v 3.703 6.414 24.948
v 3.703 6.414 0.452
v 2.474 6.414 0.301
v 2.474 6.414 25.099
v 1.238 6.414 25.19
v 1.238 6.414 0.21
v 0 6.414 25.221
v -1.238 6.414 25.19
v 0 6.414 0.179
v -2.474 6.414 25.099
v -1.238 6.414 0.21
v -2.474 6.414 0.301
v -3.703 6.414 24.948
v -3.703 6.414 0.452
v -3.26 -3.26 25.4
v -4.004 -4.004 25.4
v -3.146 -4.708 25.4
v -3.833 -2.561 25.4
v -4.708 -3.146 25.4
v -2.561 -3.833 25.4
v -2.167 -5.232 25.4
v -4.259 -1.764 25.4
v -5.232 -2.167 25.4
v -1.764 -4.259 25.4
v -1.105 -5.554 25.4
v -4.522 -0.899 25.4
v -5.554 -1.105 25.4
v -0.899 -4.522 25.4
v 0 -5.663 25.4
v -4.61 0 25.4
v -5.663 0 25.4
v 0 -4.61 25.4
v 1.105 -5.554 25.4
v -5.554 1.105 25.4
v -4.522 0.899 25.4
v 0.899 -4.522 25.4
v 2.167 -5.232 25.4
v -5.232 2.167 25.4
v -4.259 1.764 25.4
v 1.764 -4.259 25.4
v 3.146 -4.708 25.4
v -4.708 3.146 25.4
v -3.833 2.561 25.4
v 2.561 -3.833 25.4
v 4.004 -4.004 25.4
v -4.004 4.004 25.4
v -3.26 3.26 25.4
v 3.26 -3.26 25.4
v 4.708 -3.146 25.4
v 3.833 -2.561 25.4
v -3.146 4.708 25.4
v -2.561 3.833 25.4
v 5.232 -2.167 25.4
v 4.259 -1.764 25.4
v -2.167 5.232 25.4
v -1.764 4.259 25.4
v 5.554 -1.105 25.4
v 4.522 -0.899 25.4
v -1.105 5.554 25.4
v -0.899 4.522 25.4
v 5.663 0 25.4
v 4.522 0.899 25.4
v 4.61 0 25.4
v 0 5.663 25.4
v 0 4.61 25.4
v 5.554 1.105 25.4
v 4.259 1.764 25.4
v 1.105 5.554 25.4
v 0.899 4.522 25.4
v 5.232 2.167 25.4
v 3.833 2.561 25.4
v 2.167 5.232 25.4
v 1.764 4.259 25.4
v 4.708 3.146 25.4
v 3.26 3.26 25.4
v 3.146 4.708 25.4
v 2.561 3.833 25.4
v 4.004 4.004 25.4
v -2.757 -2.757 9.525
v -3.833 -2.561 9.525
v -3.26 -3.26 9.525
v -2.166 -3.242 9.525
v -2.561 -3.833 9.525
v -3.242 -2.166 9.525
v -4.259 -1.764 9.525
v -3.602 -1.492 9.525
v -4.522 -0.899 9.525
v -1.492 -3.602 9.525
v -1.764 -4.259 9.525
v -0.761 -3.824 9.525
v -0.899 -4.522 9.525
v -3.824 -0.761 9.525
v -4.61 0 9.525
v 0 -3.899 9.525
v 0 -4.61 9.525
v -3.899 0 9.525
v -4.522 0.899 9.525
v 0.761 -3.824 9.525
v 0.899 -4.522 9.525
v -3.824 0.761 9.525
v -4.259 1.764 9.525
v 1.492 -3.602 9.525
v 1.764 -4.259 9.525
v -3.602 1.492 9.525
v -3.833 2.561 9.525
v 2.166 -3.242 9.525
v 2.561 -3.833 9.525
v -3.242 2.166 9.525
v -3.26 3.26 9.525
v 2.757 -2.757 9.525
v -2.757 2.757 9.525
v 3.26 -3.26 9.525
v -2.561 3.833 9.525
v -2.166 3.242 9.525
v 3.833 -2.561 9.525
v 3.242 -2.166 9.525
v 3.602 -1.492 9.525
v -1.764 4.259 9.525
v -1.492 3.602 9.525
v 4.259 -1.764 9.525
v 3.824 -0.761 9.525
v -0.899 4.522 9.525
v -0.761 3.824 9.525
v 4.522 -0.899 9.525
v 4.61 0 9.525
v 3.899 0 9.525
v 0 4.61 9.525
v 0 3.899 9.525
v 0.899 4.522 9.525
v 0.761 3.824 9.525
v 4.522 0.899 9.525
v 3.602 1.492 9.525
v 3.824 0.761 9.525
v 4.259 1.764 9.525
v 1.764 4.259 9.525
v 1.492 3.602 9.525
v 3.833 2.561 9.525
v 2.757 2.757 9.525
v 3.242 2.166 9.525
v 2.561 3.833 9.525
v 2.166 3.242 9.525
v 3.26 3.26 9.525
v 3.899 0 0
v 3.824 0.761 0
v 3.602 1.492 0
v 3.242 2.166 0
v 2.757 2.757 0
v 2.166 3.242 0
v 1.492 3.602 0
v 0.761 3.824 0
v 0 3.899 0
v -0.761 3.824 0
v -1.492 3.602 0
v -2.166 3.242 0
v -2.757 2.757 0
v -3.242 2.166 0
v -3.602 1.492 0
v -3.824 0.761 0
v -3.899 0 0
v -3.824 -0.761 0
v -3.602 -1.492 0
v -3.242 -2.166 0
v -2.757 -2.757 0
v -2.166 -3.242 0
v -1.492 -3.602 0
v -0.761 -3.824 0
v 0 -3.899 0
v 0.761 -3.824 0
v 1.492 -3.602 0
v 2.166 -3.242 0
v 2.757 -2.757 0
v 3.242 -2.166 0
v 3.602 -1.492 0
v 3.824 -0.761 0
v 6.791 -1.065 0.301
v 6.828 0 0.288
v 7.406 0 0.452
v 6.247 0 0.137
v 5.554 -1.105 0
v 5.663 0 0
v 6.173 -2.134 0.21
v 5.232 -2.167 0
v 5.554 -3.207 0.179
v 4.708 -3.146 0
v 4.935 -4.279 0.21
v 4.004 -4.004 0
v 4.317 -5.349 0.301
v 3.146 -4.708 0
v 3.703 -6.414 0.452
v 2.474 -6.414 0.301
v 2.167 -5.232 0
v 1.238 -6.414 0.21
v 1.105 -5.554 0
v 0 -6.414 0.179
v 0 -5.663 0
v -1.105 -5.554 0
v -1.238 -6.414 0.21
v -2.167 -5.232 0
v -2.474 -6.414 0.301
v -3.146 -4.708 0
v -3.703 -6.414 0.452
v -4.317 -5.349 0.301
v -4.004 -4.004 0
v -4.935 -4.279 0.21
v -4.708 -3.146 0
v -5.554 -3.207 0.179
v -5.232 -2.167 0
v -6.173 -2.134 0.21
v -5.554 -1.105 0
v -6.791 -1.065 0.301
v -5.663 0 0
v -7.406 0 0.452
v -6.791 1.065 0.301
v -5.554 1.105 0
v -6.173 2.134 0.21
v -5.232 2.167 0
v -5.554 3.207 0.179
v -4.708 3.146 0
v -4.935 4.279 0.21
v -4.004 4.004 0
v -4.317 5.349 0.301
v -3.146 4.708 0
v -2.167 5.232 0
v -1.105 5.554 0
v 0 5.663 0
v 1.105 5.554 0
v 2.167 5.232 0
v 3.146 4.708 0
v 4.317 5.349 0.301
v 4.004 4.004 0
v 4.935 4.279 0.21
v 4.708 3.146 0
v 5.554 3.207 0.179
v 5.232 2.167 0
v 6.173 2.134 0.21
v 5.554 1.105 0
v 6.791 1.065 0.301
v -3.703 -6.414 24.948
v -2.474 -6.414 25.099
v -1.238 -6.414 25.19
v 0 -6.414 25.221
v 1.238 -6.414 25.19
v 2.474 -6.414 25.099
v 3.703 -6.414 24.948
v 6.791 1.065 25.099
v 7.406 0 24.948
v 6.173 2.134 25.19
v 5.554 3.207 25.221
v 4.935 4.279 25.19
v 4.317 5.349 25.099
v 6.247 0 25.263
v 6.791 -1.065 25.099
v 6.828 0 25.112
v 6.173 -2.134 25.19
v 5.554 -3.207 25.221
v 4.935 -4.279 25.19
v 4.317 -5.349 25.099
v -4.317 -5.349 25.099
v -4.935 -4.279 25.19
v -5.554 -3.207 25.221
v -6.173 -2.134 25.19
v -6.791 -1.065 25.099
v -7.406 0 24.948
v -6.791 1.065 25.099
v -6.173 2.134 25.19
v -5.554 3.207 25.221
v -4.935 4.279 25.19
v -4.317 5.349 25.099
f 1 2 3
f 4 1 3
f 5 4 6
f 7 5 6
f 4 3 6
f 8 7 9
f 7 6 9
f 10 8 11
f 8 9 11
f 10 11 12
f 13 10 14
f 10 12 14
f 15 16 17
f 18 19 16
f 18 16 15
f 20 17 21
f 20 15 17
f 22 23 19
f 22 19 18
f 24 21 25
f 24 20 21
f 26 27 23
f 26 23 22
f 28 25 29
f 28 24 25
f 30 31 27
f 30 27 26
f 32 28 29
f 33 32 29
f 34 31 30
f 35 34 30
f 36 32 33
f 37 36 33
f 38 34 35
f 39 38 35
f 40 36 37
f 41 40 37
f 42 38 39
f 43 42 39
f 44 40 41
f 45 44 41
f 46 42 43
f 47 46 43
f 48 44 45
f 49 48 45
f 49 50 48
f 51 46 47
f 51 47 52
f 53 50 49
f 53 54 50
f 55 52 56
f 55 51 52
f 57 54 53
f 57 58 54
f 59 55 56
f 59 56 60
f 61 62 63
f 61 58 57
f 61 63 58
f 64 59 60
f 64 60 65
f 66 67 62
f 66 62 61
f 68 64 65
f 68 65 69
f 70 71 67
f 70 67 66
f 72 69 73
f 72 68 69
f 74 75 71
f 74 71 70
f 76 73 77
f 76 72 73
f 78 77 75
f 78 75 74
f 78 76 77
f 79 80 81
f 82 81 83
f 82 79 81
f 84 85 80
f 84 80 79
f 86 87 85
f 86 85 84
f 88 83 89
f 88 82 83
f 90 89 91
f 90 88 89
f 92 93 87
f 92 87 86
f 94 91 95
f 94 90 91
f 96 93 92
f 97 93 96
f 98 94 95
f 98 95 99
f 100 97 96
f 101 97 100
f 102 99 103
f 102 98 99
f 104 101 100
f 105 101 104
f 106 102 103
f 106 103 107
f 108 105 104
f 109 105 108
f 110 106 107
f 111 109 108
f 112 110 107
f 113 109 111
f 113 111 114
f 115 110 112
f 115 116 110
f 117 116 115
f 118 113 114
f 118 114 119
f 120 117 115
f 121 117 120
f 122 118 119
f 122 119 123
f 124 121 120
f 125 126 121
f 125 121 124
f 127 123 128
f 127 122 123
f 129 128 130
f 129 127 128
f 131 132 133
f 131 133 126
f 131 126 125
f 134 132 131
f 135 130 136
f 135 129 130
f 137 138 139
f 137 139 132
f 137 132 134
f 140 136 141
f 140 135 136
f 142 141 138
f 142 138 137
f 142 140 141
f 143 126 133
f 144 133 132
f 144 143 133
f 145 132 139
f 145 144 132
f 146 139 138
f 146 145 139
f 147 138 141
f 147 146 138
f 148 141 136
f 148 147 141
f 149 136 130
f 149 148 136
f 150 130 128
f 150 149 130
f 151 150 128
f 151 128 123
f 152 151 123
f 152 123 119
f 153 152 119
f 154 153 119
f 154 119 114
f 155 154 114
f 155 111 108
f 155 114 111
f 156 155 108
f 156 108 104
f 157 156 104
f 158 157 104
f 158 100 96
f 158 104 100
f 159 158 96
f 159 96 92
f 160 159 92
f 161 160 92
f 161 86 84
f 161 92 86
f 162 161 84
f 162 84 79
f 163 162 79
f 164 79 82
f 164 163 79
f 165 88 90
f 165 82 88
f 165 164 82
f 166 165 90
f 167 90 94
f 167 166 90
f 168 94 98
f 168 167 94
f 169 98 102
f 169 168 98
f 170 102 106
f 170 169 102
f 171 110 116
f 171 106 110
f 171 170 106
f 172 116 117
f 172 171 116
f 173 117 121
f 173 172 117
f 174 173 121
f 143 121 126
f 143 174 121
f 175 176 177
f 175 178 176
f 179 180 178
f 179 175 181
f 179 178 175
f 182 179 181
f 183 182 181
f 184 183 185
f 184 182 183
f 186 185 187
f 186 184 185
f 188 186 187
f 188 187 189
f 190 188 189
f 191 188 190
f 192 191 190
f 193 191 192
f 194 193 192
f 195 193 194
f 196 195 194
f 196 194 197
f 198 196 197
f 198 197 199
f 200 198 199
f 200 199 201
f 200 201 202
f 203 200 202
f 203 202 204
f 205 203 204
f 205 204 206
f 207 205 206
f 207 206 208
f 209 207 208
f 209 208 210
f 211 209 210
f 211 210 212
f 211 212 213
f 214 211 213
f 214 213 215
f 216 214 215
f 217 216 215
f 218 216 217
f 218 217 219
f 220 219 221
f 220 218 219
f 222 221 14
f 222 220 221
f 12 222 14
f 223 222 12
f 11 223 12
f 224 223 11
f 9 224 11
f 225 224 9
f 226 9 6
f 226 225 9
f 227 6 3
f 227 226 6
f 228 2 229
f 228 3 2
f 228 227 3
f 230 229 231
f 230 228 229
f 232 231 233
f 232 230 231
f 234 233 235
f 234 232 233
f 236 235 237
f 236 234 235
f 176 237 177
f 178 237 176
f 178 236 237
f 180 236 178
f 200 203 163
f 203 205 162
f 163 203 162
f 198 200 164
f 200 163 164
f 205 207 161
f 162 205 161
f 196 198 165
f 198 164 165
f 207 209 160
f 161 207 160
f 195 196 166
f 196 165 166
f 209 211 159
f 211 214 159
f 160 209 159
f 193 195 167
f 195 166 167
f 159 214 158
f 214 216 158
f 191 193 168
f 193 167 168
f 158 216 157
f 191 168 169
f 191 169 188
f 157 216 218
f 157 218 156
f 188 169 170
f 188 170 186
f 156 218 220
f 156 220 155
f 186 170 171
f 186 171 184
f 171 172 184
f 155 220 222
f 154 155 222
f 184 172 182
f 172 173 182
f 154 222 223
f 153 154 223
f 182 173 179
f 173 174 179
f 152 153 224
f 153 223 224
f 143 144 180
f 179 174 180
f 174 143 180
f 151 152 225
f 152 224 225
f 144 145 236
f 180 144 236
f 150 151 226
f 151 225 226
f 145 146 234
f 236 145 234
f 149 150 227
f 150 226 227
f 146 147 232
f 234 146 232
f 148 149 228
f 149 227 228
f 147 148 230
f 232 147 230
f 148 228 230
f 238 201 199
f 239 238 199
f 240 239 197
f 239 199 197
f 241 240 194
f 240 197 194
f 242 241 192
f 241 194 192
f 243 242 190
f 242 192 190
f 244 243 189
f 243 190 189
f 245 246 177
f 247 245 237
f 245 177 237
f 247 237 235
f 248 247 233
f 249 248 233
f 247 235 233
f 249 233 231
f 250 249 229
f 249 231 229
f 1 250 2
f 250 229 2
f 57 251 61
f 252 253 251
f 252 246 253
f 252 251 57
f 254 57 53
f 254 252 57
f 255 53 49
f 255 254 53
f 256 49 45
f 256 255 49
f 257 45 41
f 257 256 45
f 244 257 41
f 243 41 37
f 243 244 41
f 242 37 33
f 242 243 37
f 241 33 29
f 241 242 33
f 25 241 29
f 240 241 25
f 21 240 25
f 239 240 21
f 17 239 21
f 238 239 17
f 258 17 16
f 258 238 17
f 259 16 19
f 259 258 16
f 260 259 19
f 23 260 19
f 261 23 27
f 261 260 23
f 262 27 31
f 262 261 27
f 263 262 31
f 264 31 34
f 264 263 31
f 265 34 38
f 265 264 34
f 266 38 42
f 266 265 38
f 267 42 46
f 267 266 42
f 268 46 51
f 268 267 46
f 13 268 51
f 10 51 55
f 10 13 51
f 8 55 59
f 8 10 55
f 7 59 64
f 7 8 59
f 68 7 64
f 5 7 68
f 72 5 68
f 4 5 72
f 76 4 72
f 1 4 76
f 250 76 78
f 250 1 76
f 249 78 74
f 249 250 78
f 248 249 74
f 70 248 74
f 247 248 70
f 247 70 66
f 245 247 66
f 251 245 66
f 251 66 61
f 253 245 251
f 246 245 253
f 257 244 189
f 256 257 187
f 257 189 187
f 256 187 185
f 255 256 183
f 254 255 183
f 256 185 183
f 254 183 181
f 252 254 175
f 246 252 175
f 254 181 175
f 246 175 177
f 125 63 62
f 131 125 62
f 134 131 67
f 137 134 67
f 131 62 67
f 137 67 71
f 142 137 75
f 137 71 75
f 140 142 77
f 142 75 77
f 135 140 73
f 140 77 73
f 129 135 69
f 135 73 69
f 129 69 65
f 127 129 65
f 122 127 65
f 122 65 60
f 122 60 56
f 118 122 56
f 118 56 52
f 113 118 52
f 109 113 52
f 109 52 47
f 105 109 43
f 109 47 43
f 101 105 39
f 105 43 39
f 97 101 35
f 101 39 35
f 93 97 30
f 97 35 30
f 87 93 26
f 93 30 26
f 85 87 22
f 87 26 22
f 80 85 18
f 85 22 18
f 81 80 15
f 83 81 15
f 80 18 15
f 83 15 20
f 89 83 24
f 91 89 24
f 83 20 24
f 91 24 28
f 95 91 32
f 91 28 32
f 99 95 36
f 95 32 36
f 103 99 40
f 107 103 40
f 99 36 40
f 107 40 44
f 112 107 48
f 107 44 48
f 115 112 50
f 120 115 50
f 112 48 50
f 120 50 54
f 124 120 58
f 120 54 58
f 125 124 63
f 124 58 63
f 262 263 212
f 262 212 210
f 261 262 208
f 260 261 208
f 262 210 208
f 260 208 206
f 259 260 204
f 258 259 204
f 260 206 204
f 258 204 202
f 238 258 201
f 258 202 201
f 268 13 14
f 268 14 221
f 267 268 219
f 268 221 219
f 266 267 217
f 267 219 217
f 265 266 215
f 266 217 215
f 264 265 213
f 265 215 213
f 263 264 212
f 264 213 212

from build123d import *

# Parameters (mm, degrees)
SKETCH1_R           = 3.8989
BOSS_EXTRUDE1_DEPTH = 25.4
SKETCH2_R           = 4.6101
CUT_EXTRUDE1_DEPTH  = 15.875


with BuildPart() as part:
    # Sketch1 → Boss-Extrude1 (new body)
    with BuildSketch(Plane.XY):
        Polygon((7.405671903, 0), (3.702835951, 6.4135), (-3.702835951, 6.4135), (-7.405671903, 0), (-3.702835951, -6.4135), (3.702835951, -6.4135), align=None)
        Circle(SKETCH1_R, mode=Mode.SUBTRACT)
    extrude(amount=BOSS_EXTRUDE1_DEPTH)

    # Sketch2 → Cut-Extrude1 (cut)
    with BuildSketch(Plane.XY.offset(25.4)):
        Circle(SKETCH2_R)
    extrude(amount=-CUT_EXTRUDE1_DEPTH, mode=Mode.SUBTRACT)

    # Sketch3 → Cut-Revolve1 (revolve, cut)
    with BuildSketch(Plane(origin=(0, 0, 0), x_dir=(0, 0, -1), z_dir=(1, 0, 0)), mode=Mode.PRIVATE) as cut_revolve1_sk:
        with BuildLine():
            Line((0.623579889, 0), (5.658105548, 0))
            ThreePointArc((5.658105548, 0), (5.185391635, 5.398123633), (3.781639599, 10.631925064))
            Line((3.781639599, 10.631925064), (-1.647339525, 10.631925064))
            ThreePointArc((-1.647339525, 10.631925064), (0.049518342, 5.435874022), (0.623579889, 0))
        make_face()
        with BuildLine():
            Line((-23.752660475, 10.631925064), (-29.181639599, 10.631925064))
            ThreePointArc((-29.181639599, 10.631925064), (-30.585391635, 5.398123633), (-31.058105548, 0))
            Line((-31.058105548, 0), (-26.023579889, 0))
            ThreePointArc((-26.023579889, 0), (-25.449518342, 5.435874022), (-23.752660475, 10.631925064))
        make_face()
    revolve(cut_revolve1_sk.sketch.rotate(Axis((0, 0, 21.887655645), (0, 0, -1)), 90), axis=Axis((0, 0, 21.887655645), (0, 0, -1)), mode=Mode.SUBTRACT)


solid = part.part
